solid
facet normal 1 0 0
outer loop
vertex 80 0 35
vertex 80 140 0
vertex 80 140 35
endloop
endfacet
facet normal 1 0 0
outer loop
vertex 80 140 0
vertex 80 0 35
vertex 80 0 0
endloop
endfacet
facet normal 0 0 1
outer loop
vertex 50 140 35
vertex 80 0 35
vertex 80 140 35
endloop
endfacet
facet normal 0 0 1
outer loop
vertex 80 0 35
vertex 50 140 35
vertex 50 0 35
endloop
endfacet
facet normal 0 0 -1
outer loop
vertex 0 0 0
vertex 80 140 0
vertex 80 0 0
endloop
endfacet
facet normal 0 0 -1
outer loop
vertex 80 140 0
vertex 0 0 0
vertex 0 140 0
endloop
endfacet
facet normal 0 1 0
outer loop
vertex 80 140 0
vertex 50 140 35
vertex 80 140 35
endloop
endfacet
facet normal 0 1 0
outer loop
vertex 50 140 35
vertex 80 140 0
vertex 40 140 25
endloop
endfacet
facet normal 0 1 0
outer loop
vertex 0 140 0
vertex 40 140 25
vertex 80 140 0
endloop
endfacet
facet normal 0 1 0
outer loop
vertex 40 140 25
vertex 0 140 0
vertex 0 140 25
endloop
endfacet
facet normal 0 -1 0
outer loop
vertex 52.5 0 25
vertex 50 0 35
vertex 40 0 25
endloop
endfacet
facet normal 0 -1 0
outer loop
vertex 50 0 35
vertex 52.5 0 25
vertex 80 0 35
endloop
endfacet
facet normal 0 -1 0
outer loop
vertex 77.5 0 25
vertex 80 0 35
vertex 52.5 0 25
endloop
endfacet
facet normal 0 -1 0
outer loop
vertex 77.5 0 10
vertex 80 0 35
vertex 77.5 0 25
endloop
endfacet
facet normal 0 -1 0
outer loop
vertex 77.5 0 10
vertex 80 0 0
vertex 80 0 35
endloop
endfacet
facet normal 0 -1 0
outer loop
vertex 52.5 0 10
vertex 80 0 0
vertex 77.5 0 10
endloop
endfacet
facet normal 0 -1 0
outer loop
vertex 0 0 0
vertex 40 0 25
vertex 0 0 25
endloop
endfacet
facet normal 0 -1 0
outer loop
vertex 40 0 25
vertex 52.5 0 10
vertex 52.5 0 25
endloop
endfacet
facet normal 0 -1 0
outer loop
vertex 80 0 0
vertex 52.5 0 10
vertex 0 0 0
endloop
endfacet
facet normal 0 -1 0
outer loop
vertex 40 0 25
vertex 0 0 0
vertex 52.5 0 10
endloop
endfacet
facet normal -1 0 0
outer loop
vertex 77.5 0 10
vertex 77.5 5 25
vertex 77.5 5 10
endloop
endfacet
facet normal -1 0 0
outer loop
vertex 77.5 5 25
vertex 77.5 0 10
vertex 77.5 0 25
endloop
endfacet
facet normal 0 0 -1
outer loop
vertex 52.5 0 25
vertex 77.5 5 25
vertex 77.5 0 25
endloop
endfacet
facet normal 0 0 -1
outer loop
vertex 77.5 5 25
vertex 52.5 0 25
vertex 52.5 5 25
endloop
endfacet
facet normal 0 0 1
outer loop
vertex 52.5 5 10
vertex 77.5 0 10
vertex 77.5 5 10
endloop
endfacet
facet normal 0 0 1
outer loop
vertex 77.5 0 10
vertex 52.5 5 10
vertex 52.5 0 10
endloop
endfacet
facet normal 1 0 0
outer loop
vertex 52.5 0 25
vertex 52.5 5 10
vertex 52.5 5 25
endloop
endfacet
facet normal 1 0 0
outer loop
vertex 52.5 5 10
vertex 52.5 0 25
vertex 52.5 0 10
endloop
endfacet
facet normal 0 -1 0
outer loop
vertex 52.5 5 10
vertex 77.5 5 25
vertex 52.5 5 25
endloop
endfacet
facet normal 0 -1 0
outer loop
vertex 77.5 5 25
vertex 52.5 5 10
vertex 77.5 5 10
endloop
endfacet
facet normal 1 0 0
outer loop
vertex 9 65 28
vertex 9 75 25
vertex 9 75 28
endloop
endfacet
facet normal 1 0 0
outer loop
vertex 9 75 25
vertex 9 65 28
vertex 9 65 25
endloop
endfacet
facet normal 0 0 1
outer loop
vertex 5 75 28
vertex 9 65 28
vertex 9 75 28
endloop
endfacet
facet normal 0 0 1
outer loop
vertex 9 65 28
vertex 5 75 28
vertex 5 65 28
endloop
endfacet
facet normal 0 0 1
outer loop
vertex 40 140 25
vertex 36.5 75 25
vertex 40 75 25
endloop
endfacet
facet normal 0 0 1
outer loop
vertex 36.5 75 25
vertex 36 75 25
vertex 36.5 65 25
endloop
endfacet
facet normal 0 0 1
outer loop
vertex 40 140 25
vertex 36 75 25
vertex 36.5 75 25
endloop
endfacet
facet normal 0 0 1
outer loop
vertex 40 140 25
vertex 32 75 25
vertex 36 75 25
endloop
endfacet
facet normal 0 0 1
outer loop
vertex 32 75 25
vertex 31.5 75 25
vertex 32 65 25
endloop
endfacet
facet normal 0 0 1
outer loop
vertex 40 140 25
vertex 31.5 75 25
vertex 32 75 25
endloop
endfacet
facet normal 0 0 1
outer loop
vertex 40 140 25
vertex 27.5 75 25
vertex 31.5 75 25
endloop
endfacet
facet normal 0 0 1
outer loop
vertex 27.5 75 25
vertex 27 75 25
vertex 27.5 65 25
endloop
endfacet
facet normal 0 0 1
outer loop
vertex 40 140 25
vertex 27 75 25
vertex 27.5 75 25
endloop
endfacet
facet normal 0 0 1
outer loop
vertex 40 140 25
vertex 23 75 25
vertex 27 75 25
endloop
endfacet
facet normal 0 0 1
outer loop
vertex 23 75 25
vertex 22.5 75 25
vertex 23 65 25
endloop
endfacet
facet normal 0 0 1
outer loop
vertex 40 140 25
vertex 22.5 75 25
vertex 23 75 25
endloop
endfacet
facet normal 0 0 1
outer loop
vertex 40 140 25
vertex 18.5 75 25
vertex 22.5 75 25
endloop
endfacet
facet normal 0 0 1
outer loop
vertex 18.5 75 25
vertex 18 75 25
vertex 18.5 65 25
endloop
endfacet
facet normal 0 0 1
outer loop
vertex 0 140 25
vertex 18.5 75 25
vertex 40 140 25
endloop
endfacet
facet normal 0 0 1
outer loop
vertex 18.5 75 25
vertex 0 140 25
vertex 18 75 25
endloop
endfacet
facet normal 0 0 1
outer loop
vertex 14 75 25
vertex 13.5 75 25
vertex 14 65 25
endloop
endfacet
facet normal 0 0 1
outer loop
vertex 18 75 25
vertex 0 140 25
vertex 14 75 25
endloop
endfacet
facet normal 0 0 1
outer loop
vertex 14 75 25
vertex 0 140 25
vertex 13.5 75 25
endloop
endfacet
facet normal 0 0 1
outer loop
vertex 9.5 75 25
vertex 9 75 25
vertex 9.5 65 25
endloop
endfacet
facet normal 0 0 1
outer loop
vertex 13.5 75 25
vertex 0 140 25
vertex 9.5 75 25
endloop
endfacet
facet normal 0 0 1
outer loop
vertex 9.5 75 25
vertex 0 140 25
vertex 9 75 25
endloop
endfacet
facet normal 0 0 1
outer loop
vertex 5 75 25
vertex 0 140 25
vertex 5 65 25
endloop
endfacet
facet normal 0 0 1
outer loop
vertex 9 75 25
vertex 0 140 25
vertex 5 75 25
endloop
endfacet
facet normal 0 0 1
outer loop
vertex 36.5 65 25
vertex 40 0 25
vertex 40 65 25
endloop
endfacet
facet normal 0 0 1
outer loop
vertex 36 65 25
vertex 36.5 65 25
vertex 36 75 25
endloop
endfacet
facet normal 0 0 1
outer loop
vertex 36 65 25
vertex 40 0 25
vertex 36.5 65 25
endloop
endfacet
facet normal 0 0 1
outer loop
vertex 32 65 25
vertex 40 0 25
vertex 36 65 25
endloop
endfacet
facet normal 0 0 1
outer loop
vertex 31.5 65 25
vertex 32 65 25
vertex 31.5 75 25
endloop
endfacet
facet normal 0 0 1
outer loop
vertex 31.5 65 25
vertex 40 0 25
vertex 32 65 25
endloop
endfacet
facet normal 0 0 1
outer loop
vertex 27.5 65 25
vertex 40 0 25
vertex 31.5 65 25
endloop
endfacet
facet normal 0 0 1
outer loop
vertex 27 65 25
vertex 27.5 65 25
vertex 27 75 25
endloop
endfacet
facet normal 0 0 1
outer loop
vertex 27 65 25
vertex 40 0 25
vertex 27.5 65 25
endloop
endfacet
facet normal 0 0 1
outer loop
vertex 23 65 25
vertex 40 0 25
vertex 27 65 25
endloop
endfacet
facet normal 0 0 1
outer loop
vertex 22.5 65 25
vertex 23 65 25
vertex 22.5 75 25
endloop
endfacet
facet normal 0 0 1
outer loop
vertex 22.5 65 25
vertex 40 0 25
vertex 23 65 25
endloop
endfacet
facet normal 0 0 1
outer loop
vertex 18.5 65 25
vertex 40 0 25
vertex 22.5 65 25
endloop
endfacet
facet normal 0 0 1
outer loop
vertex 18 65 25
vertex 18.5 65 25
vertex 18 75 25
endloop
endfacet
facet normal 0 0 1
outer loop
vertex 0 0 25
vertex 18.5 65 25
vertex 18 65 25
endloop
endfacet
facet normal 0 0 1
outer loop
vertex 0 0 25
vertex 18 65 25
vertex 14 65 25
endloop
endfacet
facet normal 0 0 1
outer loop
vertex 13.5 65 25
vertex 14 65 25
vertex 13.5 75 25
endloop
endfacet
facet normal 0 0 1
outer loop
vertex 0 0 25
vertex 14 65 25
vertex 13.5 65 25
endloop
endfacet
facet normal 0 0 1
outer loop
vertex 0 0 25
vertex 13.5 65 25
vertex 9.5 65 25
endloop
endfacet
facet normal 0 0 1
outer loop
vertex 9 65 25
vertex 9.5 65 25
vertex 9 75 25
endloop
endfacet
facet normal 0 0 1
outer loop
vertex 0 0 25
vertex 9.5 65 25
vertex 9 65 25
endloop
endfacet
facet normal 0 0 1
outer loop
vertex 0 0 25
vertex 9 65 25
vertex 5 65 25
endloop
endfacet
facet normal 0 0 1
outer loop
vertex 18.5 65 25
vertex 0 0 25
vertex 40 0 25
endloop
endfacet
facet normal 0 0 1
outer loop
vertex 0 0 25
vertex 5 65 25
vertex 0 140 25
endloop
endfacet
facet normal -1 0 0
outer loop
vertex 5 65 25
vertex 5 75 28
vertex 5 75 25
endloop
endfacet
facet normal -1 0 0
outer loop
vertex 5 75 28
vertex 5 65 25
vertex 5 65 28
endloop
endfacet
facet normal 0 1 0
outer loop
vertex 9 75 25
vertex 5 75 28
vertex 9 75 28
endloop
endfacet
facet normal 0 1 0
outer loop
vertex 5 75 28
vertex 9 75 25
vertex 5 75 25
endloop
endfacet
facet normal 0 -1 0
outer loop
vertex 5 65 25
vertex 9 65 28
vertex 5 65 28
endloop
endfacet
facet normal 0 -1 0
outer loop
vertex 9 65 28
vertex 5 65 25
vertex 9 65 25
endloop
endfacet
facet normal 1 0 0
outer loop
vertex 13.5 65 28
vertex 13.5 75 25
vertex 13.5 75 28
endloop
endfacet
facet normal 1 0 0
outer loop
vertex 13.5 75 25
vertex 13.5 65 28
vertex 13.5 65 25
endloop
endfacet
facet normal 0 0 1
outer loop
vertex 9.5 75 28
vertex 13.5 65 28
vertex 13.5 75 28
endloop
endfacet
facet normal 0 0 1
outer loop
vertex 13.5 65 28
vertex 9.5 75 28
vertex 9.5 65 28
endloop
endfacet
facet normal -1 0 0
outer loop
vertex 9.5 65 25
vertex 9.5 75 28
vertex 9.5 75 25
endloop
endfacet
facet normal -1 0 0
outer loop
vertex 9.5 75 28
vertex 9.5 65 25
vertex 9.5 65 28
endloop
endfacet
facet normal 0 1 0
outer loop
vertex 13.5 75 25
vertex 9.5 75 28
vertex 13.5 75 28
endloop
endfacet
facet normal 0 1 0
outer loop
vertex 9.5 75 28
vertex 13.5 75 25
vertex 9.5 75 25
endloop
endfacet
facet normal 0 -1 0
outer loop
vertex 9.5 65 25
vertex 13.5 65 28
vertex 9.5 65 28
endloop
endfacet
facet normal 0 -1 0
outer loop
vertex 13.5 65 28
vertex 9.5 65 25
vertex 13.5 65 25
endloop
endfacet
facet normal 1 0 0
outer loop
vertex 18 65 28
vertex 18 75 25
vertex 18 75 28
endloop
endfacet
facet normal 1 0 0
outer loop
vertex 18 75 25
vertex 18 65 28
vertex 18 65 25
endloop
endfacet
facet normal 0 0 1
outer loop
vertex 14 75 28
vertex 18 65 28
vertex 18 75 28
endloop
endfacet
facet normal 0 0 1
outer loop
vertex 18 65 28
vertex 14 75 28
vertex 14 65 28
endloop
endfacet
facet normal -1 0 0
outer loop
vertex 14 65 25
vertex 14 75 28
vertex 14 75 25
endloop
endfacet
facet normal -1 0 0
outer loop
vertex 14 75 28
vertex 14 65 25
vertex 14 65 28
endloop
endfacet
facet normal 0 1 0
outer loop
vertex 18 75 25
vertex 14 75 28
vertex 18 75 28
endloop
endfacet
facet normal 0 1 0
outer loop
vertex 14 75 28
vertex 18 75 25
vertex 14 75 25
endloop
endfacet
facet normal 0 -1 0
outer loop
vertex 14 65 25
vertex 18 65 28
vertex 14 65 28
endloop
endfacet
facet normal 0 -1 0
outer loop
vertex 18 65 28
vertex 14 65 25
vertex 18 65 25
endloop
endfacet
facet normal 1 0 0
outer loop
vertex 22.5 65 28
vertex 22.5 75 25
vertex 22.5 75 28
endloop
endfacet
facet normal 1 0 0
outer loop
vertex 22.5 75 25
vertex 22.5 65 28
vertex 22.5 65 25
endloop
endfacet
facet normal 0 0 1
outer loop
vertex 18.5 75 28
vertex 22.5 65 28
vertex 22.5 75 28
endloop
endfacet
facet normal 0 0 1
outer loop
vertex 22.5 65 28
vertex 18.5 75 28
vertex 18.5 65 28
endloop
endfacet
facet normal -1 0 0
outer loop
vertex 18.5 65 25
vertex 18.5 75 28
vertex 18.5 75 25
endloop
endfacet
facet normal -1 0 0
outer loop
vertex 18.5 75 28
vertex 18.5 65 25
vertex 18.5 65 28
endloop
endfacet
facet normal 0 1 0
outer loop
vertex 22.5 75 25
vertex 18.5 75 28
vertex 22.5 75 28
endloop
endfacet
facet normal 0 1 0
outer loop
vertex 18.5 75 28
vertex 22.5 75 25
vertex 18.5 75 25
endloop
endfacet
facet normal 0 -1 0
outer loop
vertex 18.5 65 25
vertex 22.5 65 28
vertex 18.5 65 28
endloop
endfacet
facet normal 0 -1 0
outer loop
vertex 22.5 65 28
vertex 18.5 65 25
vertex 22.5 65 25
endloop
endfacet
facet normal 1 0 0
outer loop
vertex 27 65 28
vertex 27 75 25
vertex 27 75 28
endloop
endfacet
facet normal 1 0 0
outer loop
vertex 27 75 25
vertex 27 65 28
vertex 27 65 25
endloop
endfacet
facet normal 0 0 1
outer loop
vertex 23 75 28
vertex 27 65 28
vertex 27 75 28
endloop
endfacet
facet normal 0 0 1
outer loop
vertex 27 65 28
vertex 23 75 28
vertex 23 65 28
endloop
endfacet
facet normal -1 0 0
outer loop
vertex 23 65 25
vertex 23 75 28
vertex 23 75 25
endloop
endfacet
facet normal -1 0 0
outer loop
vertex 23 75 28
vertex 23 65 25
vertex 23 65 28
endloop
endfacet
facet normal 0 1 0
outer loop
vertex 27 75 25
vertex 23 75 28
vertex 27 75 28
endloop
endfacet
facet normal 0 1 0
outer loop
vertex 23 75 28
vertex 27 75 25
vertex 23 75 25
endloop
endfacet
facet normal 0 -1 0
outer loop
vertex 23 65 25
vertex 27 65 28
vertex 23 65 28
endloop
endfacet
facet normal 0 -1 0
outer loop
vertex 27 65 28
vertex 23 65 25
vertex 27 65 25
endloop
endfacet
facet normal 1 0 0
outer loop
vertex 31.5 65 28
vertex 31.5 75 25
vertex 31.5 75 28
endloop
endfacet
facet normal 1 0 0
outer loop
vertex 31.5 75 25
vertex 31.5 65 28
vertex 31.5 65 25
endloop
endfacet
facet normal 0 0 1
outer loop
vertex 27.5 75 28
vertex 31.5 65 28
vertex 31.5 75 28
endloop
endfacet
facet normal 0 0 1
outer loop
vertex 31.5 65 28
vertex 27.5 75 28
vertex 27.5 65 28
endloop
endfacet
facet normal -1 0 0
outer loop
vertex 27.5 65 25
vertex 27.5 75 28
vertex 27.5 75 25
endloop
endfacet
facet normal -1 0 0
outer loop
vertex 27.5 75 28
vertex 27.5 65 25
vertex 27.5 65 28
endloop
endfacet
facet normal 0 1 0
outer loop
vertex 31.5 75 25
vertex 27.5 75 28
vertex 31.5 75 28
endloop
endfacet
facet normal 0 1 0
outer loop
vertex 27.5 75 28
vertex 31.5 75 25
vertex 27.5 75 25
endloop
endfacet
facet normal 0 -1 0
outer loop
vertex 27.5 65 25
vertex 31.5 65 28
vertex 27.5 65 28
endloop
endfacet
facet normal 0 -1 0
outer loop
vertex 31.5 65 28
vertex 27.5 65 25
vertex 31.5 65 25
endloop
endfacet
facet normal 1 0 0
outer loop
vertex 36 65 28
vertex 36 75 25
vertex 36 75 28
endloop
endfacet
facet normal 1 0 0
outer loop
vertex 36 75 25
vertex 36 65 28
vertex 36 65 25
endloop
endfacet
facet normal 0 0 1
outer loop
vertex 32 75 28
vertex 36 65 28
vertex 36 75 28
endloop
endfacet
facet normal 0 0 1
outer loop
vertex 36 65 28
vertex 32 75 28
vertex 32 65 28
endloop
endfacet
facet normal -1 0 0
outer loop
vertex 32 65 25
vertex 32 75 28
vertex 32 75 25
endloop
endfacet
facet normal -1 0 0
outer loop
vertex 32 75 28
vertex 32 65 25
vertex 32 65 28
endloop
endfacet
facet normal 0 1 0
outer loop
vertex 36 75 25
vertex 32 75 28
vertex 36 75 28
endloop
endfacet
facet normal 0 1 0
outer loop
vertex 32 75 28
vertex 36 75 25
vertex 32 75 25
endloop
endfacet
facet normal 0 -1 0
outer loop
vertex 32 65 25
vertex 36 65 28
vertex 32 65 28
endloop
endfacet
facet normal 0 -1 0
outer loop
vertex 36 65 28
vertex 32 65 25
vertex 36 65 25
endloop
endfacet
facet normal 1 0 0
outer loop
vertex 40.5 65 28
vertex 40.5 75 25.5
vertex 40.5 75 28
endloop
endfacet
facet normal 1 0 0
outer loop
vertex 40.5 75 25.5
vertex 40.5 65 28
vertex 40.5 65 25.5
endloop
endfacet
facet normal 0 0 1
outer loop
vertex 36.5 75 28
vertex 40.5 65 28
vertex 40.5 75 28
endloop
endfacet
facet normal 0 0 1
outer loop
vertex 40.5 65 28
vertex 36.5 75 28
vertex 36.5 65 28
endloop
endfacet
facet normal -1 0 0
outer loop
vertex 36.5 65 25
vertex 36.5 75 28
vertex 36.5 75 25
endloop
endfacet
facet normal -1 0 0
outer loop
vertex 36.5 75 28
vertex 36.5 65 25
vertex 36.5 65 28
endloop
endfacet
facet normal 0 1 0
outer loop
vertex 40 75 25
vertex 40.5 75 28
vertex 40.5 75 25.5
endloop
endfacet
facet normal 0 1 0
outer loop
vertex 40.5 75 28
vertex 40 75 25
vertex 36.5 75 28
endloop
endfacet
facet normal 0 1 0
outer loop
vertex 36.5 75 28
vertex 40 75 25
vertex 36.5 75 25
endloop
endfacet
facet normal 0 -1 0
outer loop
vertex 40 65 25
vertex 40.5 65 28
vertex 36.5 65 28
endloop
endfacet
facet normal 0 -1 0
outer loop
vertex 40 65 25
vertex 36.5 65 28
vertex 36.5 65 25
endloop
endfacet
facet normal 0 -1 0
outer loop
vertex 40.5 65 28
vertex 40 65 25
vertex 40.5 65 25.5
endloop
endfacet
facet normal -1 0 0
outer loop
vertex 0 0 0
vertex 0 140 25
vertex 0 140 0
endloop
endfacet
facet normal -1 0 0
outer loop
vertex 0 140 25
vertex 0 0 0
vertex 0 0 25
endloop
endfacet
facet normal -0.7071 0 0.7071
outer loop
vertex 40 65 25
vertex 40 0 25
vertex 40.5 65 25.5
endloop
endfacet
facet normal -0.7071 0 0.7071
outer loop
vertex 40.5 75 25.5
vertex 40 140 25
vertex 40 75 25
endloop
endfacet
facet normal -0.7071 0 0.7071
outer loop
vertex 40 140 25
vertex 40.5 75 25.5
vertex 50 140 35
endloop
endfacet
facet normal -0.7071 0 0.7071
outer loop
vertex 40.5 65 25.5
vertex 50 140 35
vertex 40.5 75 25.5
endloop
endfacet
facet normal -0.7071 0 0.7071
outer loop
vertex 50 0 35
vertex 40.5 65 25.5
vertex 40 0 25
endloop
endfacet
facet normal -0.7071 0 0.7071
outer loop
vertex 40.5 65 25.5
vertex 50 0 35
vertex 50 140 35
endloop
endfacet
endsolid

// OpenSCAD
// PSU Model - to understand the exact shape
// Based on your description:
// Side is 9cm long with this profile:
//       /---|
//  ----/    |
// |         |
// ----------
// Short part: 4cm long, 2.5cm high
// Ramp: 1cm long  
// Tall part: 3cm long, 3.5cm high
// Width: 14cm
// Power socket on right side of tall part

// PSU dimensions
psu_length = 90;        // 9cm side length
psu_width = 140;        // 14cm width  
psu_short_height = 25;  // 2.5cm high (short part)
psu_tall_height = 35;   // 3.5cm high (tall part)
psu_short_length = 40;  // 4cm long (short part)
psu_ramp_length = 10;   // 1cm long (ramp)
psu_tall_length = 30;   // 3cm long (tall part) - calculated: 90-40-10=40, but you said 3cm, so using 30

module psu_model() {
    union() {
        // Short part (left side)
        translate([0, 0, 0])
        cube([psu_short_length, psu_width, psu_short_height]);
        
        // Ramp part (middle) - angled transition
        translate([psu_short_length, 0, 0])
        hull() {
            // Bottom of ramp (same height as short part)
            cube([0.1, psu_width, psu_short_height]);
            // Top of ramp (same height as tall part)  
            translate([psu_ramp_length, 0, 0])
            cube([0.1, psu_width, psu_tall_height]);
        }
        
        // Tall part (right side) - with socket cutout
        difference() {
            translate([psu_short_length + psu_ramp_length, 0, 0])
            cube([psu_tall_length, psu_width, psu_tall_height]);
            
            // Power socket cutout (on right side panel of tall part)
            socket_width = 25;
            socket_height = 15;
            socket_depth = 5;  // Depth of cutout
            
            // Position in center of tall section's left panel (opposite side)
            translate([psu_short_length + psu_ramp_length + (psu_tall_length - socket_width)/2, 
                      -1, 
                      psu_tall_height/2 - socket_height/2])
            cube([socket_width, socket_depth + 1, socket_height]);
        }
        
        // USB ports representation (on top of short part - low area)
        for (i = [0:7]) {
            translate([5 + i * 4.5, psu_width/2 - 5, psu_short_height])
            cube([4, 10, 3]);
        }
    }
}

// Show the PSU model
psu_model();
